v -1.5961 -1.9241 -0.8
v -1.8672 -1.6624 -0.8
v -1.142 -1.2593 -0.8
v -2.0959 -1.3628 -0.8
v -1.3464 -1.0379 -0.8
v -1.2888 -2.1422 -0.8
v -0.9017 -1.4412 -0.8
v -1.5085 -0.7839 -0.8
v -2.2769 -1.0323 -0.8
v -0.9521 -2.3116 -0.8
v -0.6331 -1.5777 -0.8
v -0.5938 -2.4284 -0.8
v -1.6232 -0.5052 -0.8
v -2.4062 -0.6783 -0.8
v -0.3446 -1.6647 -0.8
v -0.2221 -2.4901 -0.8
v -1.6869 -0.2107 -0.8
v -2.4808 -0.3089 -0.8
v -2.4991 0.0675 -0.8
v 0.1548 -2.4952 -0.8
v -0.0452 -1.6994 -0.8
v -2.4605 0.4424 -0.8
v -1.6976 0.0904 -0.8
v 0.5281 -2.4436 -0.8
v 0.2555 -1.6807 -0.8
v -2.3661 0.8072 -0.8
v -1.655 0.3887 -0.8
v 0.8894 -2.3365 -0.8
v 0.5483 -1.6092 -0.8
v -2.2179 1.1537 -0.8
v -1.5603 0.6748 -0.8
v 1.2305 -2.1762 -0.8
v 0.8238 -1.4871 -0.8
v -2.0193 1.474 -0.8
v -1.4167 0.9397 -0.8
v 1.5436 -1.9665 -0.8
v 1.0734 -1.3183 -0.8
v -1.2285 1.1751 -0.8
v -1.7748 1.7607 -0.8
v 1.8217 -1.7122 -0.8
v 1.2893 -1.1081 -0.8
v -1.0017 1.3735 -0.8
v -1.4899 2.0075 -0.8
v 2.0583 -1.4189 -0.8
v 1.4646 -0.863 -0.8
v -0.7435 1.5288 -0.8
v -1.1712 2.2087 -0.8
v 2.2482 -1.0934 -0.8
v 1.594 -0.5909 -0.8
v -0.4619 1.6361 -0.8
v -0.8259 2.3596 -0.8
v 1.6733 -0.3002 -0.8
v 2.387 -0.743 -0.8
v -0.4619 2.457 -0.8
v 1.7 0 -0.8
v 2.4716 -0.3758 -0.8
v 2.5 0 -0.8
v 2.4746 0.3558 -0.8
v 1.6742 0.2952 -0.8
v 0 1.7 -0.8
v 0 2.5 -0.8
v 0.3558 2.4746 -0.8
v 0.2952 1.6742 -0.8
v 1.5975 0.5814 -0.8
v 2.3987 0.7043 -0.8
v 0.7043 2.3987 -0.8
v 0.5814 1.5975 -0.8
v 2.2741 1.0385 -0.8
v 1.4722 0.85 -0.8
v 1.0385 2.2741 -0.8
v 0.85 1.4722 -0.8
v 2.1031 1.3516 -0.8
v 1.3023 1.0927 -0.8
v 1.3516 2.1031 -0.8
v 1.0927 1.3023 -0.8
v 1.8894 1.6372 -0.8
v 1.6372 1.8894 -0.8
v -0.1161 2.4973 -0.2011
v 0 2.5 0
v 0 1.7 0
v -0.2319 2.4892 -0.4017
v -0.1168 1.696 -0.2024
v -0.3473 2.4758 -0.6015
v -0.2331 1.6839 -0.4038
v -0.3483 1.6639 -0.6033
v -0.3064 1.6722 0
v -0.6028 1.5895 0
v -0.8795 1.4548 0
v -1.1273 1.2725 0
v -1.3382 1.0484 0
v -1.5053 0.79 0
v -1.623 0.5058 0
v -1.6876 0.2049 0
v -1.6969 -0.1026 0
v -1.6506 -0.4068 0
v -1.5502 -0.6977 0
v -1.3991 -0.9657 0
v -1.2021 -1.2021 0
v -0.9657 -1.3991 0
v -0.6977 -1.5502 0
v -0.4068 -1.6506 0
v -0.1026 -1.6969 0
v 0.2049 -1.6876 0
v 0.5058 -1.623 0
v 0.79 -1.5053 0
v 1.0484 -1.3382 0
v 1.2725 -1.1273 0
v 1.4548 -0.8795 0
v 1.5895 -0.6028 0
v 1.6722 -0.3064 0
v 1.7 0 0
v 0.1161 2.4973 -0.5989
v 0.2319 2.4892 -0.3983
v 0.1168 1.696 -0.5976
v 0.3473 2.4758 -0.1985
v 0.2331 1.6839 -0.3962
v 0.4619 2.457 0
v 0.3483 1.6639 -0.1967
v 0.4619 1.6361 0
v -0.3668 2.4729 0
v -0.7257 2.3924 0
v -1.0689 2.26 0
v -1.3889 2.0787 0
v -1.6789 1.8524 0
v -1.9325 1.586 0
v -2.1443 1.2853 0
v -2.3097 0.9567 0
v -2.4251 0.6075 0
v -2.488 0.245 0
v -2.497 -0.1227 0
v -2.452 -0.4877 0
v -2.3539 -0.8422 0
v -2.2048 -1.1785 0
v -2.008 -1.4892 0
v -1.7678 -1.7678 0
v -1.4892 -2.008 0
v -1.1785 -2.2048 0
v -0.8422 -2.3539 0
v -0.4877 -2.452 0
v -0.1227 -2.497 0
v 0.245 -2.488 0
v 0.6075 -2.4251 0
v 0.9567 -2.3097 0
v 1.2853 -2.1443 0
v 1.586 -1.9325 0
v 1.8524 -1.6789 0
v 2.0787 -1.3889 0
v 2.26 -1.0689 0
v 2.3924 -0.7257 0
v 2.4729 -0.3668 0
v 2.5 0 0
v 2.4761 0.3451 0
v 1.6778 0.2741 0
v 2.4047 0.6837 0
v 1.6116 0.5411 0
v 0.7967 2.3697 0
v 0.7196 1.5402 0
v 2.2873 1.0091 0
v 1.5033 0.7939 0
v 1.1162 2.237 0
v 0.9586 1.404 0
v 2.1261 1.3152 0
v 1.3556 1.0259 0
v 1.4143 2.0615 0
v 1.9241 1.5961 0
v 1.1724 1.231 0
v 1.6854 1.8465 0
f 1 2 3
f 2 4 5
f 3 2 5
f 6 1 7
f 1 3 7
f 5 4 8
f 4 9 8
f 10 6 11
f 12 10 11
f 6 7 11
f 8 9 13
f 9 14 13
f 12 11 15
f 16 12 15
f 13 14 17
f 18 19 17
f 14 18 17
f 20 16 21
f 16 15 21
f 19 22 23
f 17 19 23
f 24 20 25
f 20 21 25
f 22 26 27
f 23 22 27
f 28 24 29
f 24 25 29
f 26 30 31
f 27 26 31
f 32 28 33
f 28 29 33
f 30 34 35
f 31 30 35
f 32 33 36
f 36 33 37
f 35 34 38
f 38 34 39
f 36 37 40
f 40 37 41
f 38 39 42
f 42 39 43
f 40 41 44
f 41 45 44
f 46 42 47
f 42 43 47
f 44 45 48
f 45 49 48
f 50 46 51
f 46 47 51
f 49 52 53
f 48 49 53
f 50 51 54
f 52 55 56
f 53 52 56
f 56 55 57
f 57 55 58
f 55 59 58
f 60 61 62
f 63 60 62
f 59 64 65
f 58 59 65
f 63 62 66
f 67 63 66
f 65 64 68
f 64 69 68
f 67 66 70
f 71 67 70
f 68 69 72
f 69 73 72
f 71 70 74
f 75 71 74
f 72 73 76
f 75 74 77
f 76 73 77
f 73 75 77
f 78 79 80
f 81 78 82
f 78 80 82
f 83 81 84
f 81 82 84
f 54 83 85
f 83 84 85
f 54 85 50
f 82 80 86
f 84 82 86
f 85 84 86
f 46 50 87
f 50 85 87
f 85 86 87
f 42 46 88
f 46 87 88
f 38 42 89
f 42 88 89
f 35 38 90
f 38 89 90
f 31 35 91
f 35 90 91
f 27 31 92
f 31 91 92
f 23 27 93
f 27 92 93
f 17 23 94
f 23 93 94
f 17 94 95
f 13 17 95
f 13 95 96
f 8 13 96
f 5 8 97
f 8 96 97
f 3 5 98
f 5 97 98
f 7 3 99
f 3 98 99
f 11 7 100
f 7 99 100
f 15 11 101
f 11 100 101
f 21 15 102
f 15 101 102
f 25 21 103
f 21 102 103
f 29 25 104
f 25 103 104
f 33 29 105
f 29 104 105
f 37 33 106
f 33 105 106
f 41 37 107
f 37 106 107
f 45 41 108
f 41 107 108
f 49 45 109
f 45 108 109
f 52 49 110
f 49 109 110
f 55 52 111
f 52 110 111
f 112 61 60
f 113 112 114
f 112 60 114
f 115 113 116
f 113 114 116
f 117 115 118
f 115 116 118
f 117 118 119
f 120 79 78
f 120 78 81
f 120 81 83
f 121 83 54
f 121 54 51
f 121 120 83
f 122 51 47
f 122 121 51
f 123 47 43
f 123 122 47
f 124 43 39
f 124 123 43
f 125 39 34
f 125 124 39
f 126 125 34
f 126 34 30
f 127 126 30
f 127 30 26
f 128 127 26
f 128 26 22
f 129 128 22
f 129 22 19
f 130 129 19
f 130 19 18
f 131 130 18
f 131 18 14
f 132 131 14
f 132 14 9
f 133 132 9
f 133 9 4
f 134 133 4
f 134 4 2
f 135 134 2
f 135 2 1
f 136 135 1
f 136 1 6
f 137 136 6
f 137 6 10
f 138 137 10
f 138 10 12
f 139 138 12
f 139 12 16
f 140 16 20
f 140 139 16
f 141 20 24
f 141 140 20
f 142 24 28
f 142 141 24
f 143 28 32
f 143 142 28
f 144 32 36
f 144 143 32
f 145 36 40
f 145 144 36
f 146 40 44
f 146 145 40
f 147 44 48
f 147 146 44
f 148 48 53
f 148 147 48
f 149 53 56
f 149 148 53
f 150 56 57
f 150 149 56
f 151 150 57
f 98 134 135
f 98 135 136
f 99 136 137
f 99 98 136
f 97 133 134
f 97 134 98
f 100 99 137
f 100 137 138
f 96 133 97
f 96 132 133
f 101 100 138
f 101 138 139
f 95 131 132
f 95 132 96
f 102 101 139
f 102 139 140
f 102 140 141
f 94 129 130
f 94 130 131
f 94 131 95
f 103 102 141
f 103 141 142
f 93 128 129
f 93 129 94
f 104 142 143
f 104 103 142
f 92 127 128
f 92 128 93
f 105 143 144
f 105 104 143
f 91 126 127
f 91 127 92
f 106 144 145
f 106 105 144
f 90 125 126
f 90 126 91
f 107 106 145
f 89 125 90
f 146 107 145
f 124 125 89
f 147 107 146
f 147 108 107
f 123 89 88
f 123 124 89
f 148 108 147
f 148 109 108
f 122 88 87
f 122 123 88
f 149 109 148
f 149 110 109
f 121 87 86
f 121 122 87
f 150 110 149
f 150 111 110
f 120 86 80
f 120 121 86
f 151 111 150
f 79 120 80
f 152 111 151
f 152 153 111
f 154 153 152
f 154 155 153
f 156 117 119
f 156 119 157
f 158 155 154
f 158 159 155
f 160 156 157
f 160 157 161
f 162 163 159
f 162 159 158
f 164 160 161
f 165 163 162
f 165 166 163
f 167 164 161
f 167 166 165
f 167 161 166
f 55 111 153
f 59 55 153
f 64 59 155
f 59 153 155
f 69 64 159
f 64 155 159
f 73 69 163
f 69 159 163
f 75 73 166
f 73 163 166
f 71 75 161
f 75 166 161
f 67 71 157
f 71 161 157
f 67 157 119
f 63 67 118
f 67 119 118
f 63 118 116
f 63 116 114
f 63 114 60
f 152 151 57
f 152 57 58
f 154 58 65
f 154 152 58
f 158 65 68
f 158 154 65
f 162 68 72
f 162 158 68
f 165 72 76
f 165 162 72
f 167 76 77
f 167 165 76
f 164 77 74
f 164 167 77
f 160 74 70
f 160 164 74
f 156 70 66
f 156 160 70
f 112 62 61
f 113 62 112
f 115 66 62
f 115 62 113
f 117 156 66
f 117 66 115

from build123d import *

# Parameters (mm, degrees)
SKETCH1_R          = 2.5
SKETCH1_R_2        = 1.7
BASE_EXTRUDE_DEPTH = 0.8
CUT_EXTRUDE1_DEPTH = 3.5


with BuildPart() as part:
    # Sketch1 → Base-Extrude (new body)
    with BuildSketch(Plane.XY):
        Circle(SKETCH1_R)
        Circle(SKETCH1_R_2, mode=Mode.SUBTRACT)
    extrude(amount=-BASE_EXTRUDE_DEPTH)

    # Sketch2 → Cut-Extrude1 (cut, through all)
    with BuildSketch(Plane(origin=(0, 0, 0), x_dir=(1, 0, 0), z_dir=(0, 1, 0))):
        Polygon((0, 0.8), (0.461880215, 0), (0, 0), (-0.461880215, 0.8), align=None)
    extrude(amount=CUT_EXTRUDE1_DEPTH, mode=Mode.SUBTRACT)


solid = part.part
